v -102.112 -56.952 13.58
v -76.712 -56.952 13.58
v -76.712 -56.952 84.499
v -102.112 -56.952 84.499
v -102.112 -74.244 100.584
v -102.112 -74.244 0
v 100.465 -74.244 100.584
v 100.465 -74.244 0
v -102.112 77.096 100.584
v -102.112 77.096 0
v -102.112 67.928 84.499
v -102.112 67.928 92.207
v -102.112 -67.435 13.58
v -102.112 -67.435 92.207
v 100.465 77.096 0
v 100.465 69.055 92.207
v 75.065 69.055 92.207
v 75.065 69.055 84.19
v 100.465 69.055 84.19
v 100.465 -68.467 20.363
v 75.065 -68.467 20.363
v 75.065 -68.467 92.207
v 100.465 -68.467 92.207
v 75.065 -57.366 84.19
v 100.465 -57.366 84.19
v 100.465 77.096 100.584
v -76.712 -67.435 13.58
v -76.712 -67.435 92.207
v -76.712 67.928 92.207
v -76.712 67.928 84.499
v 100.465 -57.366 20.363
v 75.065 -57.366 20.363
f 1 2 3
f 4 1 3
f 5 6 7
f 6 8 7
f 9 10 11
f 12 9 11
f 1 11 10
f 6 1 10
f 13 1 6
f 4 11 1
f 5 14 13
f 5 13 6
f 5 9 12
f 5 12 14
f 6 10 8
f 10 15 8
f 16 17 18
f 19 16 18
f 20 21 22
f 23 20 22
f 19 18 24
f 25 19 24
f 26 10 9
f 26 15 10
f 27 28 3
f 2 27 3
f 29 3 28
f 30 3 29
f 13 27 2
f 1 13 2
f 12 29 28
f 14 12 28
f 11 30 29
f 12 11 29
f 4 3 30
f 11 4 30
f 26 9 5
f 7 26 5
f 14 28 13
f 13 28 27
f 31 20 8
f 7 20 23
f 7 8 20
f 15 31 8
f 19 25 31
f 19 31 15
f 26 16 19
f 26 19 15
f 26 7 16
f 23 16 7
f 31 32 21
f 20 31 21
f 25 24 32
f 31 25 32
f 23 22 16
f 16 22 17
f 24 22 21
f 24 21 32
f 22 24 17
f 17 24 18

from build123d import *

# Parameters (mm, degrees)
F0_W     = 151.777678
F0_H     = 151.339829
F1_DEPTH = 100.584
F2_W     = 151.339829
F2_H     = 100.584
F3_DEPTH = 25.4
F4_W     = 151.339829
F4_H     = 100.584
F5_DEPTH = 25.4


with BuildPart() as f1:
    # F0 (on Top) → F1 (new body)
    with BuildSketch(Plane.XY):
        with Locations((-0.823509, 1.426369)):
            Rectangle(F0_W, F0_H)
    extrude(amount=F1_DEPTH)

    # F2 (on face) → F3 (join)
    with BuildSketch(Plane.YZ.offset(75.06533)):
        with Locations((1.426369, 50.292)):
            Rectangle(F2_W, F2_H)
        Polygon((-68.466783, 20.36312), (-68.466783, 84.190369), (-68.466783, 92.207313), (-57.366394, 92.207313), (69.054723, 92.207313), (69.054723, 84.190369), (-57.366394, 84.190369), (-57.366394, 20.36312), align=None, mode=Mode.SUBTRACT)
    extrude(amount=F3_DEPTH)

    # F4 (on face) → F5 (join)
    with BuildSketch(Plane(origin=(-76.712348, 0, 0), x_dir=(0, -1, 0), z_dir=(-1, 0, 0))):
        with Locations((-1.426369, 50.292)):
            Rectangle(F4_W, F4_H)
        Polygon((56.951661, 92.207313), (67.435369, 92.207313), (67.435369, 84.498711), (67.435369, 13.579548), (56.951661, 13.579548), (56.951661, 84.498711), (-67.927733, 84.498711), (-67.927733, 92.207313), align=None, mode=Mode.SUBTRACT)
    extrude(amount=F5_DEPTH)


solid = f1.part
